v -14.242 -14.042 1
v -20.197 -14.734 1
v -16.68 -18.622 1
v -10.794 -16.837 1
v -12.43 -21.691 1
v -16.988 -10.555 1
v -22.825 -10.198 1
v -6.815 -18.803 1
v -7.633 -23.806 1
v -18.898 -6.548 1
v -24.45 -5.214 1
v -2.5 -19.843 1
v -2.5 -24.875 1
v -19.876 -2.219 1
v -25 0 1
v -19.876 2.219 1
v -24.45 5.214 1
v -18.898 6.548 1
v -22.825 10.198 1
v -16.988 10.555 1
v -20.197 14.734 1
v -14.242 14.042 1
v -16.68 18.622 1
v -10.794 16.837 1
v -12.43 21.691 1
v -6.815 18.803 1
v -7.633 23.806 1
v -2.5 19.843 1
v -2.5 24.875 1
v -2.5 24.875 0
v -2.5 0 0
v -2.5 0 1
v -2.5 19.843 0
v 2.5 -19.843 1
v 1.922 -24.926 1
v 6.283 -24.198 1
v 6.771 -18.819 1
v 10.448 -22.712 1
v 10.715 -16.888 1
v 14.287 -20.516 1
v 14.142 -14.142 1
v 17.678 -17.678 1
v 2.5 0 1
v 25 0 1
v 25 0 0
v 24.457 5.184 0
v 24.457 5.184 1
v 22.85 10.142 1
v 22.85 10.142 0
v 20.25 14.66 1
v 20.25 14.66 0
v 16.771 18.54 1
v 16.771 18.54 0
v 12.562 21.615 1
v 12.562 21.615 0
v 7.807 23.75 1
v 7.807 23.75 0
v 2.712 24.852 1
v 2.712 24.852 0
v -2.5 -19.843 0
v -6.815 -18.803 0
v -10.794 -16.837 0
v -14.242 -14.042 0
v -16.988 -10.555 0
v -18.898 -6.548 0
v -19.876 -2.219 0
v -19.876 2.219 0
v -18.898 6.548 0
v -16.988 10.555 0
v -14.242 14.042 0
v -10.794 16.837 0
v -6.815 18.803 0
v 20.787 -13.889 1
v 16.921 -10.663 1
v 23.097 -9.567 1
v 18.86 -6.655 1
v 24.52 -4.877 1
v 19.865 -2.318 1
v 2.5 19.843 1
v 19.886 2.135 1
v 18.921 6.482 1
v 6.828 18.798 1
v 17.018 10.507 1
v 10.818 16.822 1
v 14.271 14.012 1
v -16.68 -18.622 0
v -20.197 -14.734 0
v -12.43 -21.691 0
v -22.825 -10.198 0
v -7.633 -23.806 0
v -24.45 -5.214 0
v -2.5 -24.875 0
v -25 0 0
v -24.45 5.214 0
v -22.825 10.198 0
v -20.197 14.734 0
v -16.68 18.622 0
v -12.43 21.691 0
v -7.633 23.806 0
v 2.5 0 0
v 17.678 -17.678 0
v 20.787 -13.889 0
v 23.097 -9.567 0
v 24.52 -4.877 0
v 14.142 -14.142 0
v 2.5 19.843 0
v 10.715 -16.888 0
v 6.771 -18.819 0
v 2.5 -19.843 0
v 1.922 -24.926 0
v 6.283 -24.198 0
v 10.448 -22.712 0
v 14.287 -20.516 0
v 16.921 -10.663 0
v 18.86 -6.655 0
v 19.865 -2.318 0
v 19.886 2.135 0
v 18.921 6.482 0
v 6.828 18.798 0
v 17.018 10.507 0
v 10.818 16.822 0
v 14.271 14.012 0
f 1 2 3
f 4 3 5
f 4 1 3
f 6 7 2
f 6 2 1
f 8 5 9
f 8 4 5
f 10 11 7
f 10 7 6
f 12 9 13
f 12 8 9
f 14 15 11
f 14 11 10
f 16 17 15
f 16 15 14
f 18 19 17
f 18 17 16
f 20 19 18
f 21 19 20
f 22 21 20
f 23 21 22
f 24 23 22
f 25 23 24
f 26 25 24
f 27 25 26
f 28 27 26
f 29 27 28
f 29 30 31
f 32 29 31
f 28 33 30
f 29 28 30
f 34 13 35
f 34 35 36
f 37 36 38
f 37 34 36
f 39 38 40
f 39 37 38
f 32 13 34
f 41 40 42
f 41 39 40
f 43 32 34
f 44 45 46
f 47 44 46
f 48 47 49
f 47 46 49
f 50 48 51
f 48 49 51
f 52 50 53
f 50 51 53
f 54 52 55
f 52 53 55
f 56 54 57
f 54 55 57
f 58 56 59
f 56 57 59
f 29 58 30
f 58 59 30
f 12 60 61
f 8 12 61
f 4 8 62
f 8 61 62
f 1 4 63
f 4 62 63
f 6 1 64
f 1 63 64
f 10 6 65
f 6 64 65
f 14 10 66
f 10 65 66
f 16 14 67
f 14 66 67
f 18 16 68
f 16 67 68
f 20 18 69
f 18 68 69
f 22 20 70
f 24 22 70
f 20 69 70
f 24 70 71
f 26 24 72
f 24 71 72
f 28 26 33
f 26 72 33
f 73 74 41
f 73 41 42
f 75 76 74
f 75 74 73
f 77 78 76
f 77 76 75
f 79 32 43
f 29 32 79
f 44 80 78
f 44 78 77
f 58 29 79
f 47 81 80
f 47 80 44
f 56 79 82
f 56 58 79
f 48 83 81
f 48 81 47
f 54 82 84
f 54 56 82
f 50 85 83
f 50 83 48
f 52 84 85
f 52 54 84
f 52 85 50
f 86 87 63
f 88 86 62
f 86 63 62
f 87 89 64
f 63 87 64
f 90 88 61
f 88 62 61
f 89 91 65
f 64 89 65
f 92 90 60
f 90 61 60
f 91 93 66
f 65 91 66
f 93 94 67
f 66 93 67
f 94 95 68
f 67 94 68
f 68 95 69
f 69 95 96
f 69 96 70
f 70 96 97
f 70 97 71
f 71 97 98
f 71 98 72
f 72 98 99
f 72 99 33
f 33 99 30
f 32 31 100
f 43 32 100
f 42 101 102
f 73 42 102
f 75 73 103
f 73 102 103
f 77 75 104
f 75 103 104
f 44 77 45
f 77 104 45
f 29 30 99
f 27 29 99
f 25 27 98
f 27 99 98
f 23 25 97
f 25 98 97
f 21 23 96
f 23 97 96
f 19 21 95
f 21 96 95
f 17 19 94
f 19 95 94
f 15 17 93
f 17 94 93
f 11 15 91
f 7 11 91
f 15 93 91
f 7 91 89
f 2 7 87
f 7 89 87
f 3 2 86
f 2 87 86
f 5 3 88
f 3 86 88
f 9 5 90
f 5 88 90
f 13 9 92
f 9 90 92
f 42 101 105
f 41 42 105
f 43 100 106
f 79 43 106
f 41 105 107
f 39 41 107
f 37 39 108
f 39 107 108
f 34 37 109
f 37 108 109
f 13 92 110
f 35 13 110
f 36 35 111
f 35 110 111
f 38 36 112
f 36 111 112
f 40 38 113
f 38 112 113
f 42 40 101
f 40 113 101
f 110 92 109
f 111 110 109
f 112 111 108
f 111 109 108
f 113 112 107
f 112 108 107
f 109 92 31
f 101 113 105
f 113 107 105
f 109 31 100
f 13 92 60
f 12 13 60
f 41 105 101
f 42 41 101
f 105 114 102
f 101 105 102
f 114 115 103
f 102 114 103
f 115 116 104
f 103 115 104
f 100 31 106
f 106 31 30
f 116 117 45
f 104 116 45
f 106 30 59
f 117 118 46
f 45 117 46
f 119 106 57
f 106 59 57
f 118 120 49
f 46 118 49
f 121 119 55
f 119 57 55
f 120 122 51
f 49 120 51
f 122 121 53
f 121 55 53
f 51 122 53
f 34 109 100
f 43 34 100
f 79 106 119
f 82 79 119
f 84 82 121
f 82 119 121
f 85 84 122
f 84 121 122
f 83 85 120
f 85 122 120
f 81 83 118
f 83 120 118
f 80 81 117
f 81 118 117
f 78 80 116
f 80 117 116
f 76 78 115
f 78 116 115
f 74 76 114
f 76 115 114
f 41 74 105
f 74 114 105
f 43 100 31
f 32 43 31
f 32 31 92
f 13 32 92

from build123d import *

# Parameters (mm, degrees)
F1_DEPTH = 1
F2_DEPTH = 1
F3_DEPTH = 1


with BuildPart() as f1:
    # F0 (on Top) → F1 (new body)
    with BuildSketch(Plane.XY):
        with BuildLine():
            Line((-2.5, 19.843135), (-2.5, 24.874686))
            ThreePointArc((-2.5, 24.874686), (-25, 0), (-2.5, -24.874686))
            Line((-2.5, -24.874686), (-2.5, -19.843135))
            ThreePointArc((-2.5, -19.843135), (-20, 0), (-2.5, 19.843135))
        make_face()
    extrude(amount=F1_DEPTH)


with BuildPart() as f2:
    # F0 (on Top) → F2 (new body)
    with BuildSketch(Plane.XY):
        with BuildLine():
            ThreePointArc((17.67767, -17.67767), (23.096988, -9.567086), (25, 0))
            ThreePointArc((25, 0), (16.77051, 18.540496), (-2.5, 24.874686))
            Line((-2.5, 24.874686), (-2.5, 19.843135))
            Line((-2.5, 19.843135), (-2.5, 0))
            Line((-2.5, 0), (2.5, 0))
            Line((2.5, 0), (2.5, 19.843135))
            ThreePointArc((2.5, 19.843135), (18.920619, 6.481526), (14.142136, -14.142136))
            Line((14.142136, -14.142136), (17.67767, -17.67767))
        make_face()
    extrude(amount=F2_DEPTH)


with BuildPart() as f3:
    # F0 (on Top) → F3 (new body)
    with BuildSketch(Plane.XY):
        with BuildLine():
            ThreePointArc((-2.5, -24.874686), (8.39879, -23.546981), (17.67767, -17.67767))
            Line((17.67767, -17.67767), (14.142136, -14.142136))
            ThreePointArc((14.142136, -14.142136), (8.795767, -17.962029), (2.5, -19.843135))
            Line((2.5, -19.843135), (2.5, 0))
            Line((2.5, 0), (-2.5, 0))
            Line((-2.5, 0), (-2.5, -19.843135))
            Line((-2.5, -19.843135), (-2.5, -24.874686))
        make_face()
    extrude(amount=F3_DEPTH)


solid = Compound([f1.part, f2.part, f3.part])
